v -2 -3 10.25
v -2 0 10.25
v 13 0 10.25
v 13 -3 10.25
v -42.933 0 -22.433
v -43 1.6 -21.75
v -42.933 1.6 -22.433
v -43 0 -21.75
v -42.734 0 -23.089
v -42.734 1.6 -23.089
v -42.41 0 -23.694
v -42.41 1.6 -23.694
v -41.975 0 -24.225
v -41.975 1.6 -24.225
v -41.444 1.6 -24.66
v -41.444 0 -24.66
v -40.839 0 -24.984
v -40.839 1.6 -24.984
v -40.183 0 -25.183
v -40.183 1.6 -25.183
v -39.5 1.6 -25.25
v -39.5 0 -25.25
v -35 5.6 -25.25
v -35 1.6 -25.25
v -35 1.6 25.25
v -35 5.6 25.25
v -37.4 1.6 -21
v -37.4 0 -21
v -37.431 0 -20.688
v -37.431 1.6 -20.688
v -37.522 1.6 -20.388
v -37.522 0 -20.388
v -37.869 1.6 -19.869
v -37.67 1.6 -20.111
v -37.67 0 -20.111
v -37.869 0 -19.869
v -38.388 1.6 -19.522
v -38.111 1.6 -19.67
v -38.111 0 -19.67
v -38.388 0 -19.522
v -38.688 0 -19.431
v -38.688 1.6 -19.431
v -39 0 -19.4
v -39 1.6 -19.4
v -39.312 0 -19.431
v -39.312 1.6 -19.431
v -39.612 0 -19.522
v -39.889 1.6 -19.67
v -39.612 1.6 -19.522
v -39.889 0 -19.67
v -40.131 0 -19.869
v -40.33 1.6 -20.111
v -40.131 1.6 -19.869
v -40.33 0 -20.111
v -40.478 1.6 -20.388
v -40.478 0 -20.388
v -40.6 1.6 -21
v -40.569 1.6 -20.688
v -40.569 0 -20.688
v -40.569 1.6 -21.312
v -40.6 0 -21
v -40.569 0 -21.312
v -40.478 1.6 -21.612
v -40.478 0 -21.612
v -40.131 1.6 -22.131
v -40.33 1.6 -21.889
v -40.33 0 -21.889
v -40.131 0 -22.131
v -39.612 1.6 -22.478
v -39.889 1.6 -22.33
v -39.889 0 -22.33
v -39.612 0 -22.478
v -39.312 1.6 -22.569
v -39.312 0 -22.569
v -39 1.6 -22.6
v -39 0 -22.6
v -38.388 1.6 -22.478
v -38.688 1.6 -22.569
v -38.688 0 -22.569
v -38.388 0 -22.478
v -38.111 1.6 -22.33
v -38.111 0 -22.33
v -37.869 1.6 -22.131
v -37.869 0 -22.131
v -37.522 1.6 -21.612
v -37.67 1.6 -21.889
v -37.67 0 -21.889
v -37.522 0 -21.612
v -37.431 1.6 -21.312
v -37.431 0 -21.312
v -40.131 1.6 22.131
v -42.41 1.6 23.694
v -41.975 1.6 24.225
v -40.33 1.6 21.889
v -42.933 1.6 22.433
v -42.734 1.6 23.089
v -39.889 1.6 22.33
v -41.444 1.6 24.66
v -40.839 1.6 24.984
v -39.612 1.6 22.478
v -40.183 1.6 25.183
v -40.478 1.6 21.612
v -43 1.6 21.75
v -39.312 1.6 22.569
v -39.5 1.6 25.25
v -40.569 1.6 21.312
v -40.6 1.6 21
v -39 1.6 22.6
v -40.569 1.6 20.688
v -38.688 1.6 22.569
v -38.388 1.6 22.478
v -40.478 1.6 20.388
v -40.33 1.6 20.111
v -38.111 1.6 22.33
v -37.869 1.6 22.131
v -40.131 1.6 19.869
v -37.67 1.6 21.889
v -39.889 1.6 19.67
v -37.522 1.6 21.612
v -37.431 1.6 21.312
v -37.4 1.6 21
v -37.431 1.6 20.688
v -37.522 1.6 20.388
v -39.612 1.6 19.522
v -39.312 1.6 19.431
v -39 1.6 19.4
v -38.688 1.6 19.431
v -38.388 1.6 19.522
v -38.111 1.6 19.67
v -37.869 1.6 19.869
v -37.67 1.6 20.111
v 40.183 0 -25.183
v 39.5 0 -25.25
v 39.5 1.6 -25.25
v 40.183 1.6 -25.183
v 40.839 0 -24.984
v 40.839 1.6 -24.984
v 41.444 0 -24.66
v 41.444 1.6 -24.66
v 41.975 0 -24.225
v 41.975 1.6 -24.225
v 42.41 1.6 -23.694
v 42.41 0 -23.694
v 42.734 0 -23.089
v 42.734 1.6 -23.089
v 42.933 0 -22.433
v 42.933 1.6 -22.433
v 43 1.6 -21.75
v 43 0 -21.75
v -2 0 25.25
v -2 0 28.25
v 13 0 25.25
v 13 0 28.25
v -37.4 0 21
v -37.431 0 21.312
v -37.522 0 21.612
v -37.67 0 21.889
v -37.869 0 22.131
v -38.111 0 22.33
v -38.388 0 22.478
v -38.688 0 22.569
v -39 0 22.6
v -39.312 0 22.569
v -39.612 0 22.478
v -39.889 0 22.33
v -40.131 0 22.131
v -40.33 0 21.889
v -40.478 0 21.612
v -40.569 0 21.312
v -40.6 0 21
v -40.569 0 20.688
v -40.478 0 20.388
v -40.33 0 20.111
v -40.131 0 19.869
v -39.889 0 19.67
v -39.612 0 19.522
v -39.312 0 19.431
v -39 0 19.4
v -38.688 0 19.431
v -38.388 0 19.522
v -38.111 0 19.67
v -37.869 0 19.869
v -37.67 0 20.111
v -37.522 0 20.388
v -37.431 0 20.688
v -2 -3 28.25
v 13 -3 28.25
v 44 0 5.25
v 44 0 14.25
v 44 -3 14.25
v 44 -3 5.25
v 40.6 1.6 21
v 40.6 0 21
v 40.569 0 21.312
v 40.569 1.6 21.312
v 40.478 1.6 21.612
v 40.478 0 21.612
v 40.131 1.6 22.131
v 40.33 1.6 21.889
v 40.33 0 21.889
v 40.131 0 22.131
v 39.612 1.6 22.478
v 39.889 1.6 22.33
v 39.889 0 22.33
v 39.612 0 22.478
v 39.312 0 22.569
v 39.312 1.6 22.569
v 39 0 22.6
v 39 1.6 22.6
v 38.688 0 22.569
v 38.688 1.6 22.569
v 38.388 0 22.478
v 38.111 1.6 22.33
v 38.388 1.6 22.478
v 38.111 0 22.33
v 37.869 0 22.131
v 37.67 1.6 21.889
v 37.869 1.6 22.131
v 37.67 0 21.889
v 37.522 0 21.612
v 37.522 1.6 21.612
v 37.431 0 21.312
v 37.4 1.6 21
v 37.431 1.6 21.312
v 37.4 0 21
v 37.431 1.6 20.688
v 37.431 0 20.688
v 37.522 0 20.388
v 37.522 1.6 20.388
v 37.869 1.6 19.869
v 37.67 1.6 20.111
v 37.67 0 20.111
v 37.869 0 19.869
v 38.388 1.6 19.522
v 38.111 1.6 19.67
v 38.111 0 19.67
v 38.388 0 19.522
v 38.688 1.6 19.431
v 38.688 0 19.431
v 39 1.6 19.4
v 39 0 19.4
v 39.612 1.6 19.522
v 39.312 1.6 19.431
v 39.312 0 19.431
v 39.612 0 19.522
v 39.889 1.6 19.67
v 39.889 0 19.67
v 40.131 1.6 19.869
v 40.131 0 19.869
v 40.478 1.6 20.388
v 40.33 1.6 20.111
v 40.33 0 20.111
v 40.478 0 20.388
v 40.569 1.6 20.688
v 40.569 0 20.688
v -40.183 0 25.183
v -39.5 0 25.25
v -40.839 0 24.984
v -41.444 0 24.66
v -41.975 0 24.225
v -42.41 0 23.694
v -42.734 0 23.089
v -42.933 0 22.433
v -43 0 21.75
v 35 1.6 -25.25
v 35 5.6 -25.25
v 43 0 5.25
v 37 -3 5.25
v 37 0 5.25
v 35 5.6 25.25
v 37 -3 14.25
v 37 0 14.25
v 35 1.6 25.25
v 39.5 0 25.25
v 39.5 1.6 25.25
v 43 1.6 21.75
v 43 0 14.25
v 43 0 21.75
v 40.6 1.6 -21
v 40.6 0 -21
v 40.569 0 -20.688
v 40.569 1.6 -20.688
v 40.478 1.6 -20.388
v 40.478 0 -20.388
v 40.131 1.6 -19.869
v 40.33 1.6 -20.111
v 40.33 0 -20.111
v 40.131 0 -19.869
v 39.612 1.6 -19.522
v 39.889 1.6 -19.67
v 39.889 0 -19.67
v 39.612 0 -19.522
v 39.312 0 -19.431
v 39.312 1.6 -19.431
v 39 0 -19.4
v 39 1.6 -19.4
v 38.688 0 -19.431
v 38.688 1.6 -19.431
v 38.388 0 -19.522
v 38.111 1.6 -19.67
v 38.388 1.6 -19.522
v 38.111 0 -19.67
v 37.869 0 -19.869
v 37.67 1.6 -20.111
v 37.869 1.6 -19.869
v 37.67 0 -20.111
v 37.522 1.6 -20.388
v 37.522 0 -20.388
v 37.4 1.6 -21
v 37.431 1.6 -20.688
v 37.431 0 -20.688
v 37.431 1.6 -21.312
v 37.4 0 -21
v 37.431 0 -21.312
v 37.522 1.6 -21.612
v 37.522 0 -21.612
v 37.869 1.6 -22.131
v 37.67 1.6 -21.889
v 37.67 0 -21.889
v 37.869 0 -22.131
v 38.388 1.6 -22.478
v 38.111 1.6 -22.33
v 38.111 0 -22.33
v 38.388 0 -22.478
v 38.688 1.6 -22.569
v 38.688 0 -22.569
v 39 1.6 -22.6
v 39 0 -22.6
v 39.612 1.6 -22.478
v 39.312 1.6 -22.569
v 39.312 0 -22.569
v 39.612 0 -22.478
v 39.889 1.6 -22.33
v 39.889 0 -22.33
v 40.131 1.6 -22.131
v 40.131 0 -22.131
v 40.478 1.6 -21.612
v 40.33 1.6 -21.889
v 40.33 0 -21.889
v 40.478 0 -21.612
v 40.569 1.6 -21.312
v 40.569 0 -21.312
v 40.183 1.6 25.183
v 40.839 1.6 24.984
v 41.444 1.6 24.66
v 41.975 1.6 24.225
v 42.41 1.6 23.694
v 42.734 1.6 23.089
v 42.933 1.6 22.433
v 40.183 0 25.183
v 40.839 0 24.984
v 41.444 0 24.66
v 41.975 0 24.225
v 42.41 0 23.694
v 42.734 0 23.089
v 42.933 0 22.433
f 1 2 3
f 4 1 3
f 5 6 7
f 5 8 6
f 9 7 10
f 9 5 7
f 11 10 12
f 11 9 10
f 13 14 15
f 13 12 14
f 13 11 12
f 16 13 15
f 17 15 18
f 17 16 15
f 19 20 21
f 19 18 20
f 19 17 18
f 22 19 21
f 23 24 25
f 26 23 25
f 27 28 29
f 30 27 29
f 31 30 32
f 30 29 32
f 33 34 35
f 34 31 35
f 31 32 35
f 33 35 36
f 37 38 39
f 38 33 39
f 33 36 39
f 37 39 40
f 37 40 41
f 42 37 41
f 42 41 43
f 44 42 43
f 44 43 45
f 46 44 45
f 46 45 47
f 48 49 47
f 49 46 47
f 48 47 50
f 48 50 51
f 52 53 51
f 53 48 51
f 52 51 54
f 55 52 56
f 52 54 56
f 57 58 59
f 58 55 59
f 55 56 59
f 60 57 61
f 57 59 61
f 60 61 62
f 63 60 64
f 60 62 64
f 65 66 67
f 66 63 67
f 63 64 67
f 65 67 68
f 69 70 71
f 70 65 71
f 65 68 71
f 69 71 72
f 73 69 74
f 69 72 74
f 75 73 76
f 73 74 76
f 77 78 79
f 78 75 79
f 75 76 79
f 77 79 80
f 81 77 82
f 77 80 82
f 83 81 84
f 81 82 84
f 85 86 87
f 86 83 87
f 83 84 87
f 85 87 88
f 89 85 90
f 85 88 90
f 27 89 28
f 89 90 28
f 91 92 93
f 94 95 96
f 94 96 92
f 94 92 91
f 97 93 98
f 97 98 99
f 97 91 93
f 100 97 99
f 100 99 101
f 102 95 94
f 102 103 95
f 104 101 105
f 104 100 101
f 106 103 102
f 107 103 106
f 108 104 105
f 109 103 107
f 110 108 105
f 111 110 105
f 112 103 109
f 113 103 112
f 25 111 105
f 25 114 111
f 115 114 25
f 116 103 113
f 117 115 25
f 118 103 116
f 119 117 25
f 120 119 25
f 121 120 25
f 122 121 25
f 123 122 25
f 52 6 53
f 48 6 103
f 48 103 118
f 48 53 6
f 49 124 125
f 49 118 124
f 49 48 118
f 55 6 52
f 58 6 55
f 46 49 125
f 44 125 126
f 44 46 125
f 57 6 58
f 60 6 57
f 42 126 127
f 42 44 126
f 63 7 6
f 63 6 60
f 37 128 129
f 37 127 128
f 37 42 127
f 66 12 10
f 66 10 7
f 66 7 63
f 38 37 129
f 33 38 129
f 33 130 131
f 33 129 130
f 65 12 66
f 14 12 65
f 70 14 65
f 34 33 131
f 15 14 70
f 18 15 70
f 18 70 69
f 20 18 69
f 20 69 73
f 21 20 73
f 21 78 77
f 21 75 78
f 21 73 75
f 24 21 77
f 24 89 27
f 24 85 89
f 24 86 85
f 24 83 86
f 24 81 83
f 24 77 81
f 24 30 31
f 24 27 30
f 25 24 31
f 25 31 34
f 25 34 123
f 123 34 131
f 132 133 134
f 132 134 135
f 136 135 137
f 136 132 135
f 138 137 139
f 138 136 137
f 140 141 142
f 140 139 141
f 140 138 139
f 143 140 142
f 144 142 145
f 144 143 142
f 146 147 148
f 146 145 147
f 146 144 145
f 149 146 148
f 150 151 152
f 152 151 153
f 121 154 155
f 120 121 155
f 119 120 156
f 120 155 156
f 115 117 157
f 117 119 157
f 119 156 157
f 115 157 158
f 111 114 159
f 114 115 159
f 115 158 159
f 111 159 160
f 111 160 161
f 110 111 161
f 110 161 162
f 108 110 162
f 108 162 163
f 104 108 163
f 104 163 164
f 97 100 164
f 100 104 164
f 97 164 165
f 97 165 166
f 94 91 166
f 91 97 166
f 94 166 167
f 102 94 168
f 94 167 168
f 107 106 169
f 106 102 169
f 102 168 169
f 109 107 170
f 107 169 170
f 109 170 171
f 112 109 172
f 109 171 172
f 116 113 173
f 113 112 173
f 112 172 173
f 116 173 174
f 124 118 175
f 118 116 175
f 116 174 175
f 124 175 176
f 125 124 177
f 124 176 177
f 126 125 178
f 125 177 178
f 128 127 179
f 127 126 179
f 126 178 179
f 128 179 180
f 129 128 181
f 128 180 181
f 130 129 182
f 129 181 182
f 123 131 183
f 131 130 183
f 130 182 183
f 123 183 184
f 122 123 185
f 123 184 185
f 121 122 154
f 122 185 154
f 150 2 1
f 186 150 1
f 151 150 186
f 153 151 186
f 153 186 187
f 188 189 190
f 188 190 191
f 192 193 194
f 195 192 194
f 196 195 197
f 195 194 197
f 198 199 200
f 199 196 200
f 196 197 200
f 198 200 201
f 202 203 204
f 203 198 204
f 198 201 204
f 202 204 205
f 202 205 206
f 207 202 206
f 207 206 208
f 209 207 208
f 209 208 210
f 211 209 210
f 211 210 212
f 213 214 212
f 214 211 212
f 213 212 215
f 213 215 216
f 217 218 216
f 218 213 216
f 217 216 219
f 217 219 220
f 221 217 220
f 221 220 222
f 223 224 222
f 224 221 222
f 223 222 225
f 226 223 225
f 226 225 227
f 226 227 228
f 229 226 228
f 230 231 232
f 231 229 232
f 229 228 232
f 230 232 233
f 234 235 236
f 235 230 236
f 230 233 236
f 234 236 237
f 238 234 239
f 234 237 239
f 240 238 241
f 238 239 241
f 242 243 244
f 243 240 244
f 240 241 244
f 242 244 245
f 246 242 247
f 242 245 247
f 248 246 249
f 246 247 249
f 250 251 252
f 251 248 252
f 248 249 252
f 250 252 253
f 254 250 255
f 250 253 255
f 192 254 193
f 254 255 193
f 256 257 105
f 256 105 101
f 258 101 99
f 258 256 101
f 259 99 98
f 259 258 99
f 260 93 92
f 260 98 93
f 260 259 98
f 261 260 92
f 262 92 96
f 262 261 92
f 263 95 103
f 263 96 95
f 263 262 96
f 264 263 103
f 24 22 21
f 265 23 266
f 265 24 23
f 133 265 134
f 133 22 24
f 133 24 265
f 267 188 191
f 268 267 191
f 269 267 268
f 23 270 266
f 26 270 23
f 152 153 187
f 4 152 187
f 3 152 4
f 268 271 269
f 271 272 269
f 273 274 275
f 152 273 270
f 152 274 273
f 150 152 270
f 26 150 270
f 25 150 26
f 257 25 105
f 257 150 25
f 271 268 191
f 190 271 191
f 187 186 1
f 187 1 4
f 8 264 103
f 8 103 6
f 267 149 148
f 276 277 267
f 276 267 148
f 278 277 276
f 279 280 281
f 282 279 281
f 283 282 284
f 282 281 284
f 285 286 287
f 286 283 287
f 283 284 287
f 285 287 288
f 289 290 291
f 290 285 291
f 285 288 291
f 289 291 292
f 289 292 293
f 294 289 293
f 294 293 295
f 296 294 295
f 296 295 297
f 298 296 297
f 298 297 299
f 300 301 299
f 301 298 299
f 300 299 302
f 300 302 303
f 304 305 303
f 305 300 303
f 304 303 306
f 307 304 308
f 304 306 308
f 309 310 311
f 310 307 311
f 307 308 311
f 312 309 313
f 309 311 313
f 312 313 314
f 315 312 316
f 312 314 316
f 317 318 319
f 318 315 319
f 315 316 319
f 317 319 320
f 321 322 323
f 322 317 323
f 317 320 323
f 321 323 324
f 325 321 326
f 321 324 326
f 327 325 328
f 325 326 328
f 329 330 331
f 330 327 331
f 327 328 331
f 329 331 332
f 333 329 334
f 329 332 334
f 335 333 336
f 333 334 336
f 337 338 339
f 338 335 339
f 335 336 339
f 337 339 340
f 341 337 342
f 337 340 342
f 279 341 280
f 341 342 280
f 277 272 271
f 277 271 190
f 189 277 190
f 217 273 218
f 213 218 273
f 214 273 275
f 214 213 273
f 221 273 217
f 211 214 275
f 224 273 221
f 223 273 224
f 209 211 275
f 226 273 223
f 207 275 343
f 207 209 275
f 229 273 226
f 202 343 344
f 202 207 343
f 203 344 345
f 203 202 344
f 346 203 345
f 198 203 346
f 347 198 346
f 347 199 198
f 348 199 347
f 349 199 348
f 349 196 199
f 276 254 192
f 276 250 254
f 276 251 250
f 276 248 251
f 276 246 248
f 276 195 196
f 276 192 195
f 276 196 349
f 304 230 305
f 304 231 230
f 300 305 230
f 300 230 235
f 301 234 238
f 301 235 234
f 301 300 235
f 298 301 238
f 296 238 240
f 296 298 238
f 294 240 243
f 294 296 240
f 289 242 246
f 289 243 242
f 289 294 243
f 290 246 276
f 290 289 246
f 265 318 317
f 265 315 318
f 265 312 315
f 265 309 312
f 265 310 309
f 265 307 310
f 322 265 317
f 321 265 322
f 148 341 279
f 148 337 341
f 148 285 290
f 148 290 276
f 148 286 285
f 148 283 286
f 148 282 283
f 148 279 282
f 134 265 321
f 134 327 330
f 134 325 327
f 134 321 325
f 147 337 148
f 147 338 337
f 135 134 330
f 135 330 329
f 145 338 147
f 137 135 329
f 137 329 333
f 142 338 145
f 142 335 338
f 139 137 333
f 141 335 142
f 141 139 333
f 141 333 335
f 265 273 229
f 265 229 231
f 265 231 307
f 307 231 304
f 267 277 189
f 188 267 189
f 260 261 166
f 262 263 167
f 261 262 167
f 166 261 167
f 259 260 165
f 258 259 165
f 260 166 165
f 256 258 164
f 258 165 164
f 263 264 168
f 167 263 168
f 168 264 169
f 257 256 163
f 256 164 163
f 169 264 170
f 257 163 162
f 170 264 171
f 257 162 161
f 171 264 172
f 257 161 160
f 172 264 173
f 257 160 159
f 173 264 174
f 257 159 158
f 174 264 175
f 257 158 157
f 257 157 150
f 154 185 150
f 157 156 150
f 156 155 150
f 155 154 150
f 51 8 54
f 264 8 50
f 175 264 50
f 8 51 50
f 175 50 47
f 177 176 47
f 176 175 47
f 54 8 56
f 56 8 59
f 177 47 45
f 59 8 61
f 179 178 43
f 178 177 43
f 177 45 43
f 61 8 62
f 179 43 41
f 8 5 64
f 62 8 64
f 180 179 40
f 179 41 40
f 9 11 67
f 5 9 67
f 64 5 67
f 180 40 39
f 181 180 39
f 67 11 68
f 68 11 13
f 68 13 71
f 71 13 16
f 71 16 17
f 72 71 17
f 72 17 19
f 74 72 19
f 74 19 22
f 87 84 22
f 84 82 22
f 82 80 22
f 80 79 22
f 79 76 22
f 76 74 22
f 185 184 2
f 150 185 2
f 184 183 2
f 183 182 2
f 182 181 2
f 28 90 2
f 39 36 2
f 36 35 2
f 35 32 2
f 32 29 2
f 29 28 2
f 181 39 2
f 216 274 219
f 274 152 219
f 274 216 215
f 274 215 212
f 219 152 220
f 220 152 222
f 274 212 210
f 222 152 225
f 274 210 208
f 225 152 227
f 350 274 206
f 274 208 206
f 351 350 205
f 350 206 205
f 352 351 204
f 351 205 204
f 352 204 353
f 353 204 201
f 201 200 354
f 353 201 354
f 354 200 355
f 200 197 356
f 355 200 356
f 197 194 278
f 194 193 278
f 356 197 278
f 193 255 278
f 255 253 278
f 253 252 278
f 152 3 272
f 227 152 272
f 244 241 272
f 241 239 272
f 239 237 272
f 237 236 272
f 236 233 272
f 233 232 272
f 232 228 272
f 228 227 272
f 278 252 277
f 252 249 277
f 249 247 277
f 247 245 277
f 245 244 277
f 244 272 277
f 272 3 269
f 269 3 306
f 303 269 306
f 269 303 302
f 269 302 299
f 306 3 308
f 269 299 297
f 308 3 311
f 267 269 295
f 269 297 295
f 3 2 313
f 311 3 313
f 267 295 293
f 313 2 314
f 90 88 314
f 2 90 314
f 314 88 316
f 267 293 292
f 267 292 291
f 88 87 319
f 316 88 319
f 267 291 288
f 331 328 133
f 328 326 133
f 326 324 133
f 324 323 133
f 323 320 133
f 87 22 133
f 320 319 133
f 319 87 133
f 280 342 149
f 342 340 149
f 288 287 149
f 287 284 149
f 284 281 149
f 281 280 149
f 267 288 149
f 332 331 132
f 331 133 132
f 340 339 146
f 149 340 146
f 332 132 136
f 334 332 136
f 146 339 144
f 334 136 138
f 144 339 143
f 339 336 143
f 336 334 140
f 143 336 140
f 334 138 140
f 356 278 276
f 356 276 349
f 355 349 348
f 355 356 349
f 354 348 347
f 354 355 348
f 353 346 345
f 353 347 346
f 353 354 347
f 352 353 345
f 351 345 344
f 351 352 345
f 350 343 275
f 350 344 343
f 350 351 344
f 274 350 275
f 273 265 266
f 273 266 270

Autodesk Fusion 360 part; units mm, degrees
sketch "Sketch1" plane through (0, 0, 0) normal (0, 1, 0) x (1, 0, 0)
  line L0 (39.5, -25.25) -> (-39.5, -25.25)
  line L1 (-43, -21.75) -> (-43, 21.75)
  line L2 (-39.5, 25.25) -> (39.5, 25.25)
  line L3 (43, 21.75) -> (43, -21.75)
  line L4 (-43, -25.25) -> (43, 25.25) construction
  arc A0 (-39.5, 25.25) -> (-43, 21.75) centre (-39.5, 21.75) ccw
  arc A1 (-43, -21.75) -> (-39.5, -25.25) centre (-39.5, -21.75) ccw
  arc A2 (43, 21.75) -> (39.5, 25.25) centre (39.5, 21.75) ccw
  arc A3 (39.5, -25.25) -> (43, -21.75) centre (39.5, -21.75) ccw
  line L5 (39, -21) -> (-39, -21) construction
  line L6 (-39, -21) -> (-39, 21) construction
  line L7 (-39, 21) -> (39, 21) construction
  line L8 (39, 21) -> (39, -21) construction
  line L9 (39, -21) -> (-39, 21) construction
  line L10 (-39, -21) -> (39, 21) construction
  circle A4 centre (39, -21) radius 1.6
  circle A5 centre (39, 21) radius 1.6
  circle A6 centre (-39, 21) radius 1.6
  circle A7 centre (-39, -21) radius 1.6
  dimension "d3" = 3.5
  dimension "d4" = 78
  dimension "d5" = 42
  dimension "d6" = 3.2
  dimension "d7" = 3.2
  dimension "d8" = 3.2
  dimension "d9" = 3.2
extrude "Extrude1" add sketch "Sketch1" along normal blind 1.6
sketch "Sketch2" plane through (0, 1.6, 0) normal (0, 1, 0) x (-1, 0, 0)
  circle A0 centre (-39, -21) radius 1.6
  circle A1 centre (39, 21) radius 1.6
  circle A2 centre (-39, 21) radius 1.6
  circle A3 centre (39, -21) radius 1.6
  arc A4 (43, 21.75) -> (39.5, 25.25) centre (39.5, 21.75) ccw
  line L0 (39.5, 25.25) -> (-39.5, 25.25)
  arc A5 (-39.5, 25.25) -> (-43, 21.75) centre (-39.5, 21.75) ccw
  line L1 (-43, 21.75) -> (-43, -21.75)
  arc A6 (-43, -21.75) -> (-39.5, -25.25) centre (-39.5, -21.75) ccw
  line L2 (-39.5, -25.25) -> (39.5, -25.25)
  arc A7 (39.5, -25.25) -> (43, -21.75) centre (39.5, -21.75) ccw
  line L3 (43, -21.75) -> (43, 21.75)
  line L4 (43, -25.25) -> (35, -25.25)
  line L5 (-43, -25.25) -> (-35, -25.25)
  line L6 (-35, -25.25) -> (-35, 25.25)
  line L7 (35, -25.25) -> (35, 25.25)
  dimension "d12" = 8
  dimension "d13" = 8
extrude "Extrude2" add sketch "Sketch2" along normal blind 4 contours L0 L2 L6 L7
sketch "Sketch3" plane through (0, 0, 0) normal (0, -1, 0) x (1, 0, 0)
  circle A0 centre (39, -21) radius 1.6
  circle A1 centre (-39, 21) radius 1.6
  circle A2 centre (39, 21) radius 1.6
  circle A3 centre (-39, -21) radius 1.6
  arc A4 (-39.5, 25.25) -> (-43, 21.75) centre (-39.5, 21.75) ccw
  line L0 (-43, 21.75) -> (-43, -21.75)
  arc A5 (-43, -21.75) -> (-39.5, -25.25) centre (-39.5, -21.75) ccw
  line L1 (-39.5, -25.25) -> (39.5, -25.25)
  arc A6 (39.5, -25.25) -> (43, -21.75) centre (39.5, -21.75) ccw
  line L2 (43, -21.75) -> (43, 21.75)
  arc A7 (43, 21.75) -> (39.5, 25.25) centre (39.5, 21.75) ccw
  line L3 (39.5, 25.25) -> (-39.5, 25.25)
  line L4 (43, 25.25) -> (13, 25.25)
  line L5 (13, 25.25) -> (-2, 25.25)
  line L6 (-2, 25.25) -> (-2, 10.25)
  line L7 (-2, 10.25) -> (13, 10.25)
  line L8 (13, 10.25) -> (13, 25.25)
  line L9 (13, 25.25) -> (-2, 25.25)
  line L10 (-2, 25.25) -> (-2, 28.25)
  line L11 (-2, 28.25) -> (13, 28.25)
  line L12 (13, 28.25) -> (13, 25.25)
  line L13 (43, 25.25) -> (43, 14.25)
  line L14 (43, 14.25) -> (37, 14.25)
  line L15 (37, 14.25) -> (37, 5.25)
  line L16 (37, 5.25) -> (43, 5.25)
  line L17 (43, 5.25) -> (43, 14.25)
  line L18 (43, 14.25) -> (44, 14.25)
  line L19 (44, 14.25) -> (44, 5.25)
  line L20 (44, 5.25) -> (43, 5.25)
  line L21 (43, 5.25) -> (43, 14.25)
  dimension "d16" = 30
  dimension "d17" = 15
  dimension "d18" = 15
  dimension "d19" = 3
  dimension "d20" = 11
  dimension "d21" = 6
  dimension "d22" = 9
  dimension "d23" = 1
  dimension "d24" = 9
extrude "Extrude3" add sketch "Sketch3" along normal blind 3 contours L3 L5 L9 L10 L11 L12 | L3 L5 L6 L7 L8 L9 | L2 L17 L18 L19 L20 L21 | L2 L14 L15 L16 L17 L21
